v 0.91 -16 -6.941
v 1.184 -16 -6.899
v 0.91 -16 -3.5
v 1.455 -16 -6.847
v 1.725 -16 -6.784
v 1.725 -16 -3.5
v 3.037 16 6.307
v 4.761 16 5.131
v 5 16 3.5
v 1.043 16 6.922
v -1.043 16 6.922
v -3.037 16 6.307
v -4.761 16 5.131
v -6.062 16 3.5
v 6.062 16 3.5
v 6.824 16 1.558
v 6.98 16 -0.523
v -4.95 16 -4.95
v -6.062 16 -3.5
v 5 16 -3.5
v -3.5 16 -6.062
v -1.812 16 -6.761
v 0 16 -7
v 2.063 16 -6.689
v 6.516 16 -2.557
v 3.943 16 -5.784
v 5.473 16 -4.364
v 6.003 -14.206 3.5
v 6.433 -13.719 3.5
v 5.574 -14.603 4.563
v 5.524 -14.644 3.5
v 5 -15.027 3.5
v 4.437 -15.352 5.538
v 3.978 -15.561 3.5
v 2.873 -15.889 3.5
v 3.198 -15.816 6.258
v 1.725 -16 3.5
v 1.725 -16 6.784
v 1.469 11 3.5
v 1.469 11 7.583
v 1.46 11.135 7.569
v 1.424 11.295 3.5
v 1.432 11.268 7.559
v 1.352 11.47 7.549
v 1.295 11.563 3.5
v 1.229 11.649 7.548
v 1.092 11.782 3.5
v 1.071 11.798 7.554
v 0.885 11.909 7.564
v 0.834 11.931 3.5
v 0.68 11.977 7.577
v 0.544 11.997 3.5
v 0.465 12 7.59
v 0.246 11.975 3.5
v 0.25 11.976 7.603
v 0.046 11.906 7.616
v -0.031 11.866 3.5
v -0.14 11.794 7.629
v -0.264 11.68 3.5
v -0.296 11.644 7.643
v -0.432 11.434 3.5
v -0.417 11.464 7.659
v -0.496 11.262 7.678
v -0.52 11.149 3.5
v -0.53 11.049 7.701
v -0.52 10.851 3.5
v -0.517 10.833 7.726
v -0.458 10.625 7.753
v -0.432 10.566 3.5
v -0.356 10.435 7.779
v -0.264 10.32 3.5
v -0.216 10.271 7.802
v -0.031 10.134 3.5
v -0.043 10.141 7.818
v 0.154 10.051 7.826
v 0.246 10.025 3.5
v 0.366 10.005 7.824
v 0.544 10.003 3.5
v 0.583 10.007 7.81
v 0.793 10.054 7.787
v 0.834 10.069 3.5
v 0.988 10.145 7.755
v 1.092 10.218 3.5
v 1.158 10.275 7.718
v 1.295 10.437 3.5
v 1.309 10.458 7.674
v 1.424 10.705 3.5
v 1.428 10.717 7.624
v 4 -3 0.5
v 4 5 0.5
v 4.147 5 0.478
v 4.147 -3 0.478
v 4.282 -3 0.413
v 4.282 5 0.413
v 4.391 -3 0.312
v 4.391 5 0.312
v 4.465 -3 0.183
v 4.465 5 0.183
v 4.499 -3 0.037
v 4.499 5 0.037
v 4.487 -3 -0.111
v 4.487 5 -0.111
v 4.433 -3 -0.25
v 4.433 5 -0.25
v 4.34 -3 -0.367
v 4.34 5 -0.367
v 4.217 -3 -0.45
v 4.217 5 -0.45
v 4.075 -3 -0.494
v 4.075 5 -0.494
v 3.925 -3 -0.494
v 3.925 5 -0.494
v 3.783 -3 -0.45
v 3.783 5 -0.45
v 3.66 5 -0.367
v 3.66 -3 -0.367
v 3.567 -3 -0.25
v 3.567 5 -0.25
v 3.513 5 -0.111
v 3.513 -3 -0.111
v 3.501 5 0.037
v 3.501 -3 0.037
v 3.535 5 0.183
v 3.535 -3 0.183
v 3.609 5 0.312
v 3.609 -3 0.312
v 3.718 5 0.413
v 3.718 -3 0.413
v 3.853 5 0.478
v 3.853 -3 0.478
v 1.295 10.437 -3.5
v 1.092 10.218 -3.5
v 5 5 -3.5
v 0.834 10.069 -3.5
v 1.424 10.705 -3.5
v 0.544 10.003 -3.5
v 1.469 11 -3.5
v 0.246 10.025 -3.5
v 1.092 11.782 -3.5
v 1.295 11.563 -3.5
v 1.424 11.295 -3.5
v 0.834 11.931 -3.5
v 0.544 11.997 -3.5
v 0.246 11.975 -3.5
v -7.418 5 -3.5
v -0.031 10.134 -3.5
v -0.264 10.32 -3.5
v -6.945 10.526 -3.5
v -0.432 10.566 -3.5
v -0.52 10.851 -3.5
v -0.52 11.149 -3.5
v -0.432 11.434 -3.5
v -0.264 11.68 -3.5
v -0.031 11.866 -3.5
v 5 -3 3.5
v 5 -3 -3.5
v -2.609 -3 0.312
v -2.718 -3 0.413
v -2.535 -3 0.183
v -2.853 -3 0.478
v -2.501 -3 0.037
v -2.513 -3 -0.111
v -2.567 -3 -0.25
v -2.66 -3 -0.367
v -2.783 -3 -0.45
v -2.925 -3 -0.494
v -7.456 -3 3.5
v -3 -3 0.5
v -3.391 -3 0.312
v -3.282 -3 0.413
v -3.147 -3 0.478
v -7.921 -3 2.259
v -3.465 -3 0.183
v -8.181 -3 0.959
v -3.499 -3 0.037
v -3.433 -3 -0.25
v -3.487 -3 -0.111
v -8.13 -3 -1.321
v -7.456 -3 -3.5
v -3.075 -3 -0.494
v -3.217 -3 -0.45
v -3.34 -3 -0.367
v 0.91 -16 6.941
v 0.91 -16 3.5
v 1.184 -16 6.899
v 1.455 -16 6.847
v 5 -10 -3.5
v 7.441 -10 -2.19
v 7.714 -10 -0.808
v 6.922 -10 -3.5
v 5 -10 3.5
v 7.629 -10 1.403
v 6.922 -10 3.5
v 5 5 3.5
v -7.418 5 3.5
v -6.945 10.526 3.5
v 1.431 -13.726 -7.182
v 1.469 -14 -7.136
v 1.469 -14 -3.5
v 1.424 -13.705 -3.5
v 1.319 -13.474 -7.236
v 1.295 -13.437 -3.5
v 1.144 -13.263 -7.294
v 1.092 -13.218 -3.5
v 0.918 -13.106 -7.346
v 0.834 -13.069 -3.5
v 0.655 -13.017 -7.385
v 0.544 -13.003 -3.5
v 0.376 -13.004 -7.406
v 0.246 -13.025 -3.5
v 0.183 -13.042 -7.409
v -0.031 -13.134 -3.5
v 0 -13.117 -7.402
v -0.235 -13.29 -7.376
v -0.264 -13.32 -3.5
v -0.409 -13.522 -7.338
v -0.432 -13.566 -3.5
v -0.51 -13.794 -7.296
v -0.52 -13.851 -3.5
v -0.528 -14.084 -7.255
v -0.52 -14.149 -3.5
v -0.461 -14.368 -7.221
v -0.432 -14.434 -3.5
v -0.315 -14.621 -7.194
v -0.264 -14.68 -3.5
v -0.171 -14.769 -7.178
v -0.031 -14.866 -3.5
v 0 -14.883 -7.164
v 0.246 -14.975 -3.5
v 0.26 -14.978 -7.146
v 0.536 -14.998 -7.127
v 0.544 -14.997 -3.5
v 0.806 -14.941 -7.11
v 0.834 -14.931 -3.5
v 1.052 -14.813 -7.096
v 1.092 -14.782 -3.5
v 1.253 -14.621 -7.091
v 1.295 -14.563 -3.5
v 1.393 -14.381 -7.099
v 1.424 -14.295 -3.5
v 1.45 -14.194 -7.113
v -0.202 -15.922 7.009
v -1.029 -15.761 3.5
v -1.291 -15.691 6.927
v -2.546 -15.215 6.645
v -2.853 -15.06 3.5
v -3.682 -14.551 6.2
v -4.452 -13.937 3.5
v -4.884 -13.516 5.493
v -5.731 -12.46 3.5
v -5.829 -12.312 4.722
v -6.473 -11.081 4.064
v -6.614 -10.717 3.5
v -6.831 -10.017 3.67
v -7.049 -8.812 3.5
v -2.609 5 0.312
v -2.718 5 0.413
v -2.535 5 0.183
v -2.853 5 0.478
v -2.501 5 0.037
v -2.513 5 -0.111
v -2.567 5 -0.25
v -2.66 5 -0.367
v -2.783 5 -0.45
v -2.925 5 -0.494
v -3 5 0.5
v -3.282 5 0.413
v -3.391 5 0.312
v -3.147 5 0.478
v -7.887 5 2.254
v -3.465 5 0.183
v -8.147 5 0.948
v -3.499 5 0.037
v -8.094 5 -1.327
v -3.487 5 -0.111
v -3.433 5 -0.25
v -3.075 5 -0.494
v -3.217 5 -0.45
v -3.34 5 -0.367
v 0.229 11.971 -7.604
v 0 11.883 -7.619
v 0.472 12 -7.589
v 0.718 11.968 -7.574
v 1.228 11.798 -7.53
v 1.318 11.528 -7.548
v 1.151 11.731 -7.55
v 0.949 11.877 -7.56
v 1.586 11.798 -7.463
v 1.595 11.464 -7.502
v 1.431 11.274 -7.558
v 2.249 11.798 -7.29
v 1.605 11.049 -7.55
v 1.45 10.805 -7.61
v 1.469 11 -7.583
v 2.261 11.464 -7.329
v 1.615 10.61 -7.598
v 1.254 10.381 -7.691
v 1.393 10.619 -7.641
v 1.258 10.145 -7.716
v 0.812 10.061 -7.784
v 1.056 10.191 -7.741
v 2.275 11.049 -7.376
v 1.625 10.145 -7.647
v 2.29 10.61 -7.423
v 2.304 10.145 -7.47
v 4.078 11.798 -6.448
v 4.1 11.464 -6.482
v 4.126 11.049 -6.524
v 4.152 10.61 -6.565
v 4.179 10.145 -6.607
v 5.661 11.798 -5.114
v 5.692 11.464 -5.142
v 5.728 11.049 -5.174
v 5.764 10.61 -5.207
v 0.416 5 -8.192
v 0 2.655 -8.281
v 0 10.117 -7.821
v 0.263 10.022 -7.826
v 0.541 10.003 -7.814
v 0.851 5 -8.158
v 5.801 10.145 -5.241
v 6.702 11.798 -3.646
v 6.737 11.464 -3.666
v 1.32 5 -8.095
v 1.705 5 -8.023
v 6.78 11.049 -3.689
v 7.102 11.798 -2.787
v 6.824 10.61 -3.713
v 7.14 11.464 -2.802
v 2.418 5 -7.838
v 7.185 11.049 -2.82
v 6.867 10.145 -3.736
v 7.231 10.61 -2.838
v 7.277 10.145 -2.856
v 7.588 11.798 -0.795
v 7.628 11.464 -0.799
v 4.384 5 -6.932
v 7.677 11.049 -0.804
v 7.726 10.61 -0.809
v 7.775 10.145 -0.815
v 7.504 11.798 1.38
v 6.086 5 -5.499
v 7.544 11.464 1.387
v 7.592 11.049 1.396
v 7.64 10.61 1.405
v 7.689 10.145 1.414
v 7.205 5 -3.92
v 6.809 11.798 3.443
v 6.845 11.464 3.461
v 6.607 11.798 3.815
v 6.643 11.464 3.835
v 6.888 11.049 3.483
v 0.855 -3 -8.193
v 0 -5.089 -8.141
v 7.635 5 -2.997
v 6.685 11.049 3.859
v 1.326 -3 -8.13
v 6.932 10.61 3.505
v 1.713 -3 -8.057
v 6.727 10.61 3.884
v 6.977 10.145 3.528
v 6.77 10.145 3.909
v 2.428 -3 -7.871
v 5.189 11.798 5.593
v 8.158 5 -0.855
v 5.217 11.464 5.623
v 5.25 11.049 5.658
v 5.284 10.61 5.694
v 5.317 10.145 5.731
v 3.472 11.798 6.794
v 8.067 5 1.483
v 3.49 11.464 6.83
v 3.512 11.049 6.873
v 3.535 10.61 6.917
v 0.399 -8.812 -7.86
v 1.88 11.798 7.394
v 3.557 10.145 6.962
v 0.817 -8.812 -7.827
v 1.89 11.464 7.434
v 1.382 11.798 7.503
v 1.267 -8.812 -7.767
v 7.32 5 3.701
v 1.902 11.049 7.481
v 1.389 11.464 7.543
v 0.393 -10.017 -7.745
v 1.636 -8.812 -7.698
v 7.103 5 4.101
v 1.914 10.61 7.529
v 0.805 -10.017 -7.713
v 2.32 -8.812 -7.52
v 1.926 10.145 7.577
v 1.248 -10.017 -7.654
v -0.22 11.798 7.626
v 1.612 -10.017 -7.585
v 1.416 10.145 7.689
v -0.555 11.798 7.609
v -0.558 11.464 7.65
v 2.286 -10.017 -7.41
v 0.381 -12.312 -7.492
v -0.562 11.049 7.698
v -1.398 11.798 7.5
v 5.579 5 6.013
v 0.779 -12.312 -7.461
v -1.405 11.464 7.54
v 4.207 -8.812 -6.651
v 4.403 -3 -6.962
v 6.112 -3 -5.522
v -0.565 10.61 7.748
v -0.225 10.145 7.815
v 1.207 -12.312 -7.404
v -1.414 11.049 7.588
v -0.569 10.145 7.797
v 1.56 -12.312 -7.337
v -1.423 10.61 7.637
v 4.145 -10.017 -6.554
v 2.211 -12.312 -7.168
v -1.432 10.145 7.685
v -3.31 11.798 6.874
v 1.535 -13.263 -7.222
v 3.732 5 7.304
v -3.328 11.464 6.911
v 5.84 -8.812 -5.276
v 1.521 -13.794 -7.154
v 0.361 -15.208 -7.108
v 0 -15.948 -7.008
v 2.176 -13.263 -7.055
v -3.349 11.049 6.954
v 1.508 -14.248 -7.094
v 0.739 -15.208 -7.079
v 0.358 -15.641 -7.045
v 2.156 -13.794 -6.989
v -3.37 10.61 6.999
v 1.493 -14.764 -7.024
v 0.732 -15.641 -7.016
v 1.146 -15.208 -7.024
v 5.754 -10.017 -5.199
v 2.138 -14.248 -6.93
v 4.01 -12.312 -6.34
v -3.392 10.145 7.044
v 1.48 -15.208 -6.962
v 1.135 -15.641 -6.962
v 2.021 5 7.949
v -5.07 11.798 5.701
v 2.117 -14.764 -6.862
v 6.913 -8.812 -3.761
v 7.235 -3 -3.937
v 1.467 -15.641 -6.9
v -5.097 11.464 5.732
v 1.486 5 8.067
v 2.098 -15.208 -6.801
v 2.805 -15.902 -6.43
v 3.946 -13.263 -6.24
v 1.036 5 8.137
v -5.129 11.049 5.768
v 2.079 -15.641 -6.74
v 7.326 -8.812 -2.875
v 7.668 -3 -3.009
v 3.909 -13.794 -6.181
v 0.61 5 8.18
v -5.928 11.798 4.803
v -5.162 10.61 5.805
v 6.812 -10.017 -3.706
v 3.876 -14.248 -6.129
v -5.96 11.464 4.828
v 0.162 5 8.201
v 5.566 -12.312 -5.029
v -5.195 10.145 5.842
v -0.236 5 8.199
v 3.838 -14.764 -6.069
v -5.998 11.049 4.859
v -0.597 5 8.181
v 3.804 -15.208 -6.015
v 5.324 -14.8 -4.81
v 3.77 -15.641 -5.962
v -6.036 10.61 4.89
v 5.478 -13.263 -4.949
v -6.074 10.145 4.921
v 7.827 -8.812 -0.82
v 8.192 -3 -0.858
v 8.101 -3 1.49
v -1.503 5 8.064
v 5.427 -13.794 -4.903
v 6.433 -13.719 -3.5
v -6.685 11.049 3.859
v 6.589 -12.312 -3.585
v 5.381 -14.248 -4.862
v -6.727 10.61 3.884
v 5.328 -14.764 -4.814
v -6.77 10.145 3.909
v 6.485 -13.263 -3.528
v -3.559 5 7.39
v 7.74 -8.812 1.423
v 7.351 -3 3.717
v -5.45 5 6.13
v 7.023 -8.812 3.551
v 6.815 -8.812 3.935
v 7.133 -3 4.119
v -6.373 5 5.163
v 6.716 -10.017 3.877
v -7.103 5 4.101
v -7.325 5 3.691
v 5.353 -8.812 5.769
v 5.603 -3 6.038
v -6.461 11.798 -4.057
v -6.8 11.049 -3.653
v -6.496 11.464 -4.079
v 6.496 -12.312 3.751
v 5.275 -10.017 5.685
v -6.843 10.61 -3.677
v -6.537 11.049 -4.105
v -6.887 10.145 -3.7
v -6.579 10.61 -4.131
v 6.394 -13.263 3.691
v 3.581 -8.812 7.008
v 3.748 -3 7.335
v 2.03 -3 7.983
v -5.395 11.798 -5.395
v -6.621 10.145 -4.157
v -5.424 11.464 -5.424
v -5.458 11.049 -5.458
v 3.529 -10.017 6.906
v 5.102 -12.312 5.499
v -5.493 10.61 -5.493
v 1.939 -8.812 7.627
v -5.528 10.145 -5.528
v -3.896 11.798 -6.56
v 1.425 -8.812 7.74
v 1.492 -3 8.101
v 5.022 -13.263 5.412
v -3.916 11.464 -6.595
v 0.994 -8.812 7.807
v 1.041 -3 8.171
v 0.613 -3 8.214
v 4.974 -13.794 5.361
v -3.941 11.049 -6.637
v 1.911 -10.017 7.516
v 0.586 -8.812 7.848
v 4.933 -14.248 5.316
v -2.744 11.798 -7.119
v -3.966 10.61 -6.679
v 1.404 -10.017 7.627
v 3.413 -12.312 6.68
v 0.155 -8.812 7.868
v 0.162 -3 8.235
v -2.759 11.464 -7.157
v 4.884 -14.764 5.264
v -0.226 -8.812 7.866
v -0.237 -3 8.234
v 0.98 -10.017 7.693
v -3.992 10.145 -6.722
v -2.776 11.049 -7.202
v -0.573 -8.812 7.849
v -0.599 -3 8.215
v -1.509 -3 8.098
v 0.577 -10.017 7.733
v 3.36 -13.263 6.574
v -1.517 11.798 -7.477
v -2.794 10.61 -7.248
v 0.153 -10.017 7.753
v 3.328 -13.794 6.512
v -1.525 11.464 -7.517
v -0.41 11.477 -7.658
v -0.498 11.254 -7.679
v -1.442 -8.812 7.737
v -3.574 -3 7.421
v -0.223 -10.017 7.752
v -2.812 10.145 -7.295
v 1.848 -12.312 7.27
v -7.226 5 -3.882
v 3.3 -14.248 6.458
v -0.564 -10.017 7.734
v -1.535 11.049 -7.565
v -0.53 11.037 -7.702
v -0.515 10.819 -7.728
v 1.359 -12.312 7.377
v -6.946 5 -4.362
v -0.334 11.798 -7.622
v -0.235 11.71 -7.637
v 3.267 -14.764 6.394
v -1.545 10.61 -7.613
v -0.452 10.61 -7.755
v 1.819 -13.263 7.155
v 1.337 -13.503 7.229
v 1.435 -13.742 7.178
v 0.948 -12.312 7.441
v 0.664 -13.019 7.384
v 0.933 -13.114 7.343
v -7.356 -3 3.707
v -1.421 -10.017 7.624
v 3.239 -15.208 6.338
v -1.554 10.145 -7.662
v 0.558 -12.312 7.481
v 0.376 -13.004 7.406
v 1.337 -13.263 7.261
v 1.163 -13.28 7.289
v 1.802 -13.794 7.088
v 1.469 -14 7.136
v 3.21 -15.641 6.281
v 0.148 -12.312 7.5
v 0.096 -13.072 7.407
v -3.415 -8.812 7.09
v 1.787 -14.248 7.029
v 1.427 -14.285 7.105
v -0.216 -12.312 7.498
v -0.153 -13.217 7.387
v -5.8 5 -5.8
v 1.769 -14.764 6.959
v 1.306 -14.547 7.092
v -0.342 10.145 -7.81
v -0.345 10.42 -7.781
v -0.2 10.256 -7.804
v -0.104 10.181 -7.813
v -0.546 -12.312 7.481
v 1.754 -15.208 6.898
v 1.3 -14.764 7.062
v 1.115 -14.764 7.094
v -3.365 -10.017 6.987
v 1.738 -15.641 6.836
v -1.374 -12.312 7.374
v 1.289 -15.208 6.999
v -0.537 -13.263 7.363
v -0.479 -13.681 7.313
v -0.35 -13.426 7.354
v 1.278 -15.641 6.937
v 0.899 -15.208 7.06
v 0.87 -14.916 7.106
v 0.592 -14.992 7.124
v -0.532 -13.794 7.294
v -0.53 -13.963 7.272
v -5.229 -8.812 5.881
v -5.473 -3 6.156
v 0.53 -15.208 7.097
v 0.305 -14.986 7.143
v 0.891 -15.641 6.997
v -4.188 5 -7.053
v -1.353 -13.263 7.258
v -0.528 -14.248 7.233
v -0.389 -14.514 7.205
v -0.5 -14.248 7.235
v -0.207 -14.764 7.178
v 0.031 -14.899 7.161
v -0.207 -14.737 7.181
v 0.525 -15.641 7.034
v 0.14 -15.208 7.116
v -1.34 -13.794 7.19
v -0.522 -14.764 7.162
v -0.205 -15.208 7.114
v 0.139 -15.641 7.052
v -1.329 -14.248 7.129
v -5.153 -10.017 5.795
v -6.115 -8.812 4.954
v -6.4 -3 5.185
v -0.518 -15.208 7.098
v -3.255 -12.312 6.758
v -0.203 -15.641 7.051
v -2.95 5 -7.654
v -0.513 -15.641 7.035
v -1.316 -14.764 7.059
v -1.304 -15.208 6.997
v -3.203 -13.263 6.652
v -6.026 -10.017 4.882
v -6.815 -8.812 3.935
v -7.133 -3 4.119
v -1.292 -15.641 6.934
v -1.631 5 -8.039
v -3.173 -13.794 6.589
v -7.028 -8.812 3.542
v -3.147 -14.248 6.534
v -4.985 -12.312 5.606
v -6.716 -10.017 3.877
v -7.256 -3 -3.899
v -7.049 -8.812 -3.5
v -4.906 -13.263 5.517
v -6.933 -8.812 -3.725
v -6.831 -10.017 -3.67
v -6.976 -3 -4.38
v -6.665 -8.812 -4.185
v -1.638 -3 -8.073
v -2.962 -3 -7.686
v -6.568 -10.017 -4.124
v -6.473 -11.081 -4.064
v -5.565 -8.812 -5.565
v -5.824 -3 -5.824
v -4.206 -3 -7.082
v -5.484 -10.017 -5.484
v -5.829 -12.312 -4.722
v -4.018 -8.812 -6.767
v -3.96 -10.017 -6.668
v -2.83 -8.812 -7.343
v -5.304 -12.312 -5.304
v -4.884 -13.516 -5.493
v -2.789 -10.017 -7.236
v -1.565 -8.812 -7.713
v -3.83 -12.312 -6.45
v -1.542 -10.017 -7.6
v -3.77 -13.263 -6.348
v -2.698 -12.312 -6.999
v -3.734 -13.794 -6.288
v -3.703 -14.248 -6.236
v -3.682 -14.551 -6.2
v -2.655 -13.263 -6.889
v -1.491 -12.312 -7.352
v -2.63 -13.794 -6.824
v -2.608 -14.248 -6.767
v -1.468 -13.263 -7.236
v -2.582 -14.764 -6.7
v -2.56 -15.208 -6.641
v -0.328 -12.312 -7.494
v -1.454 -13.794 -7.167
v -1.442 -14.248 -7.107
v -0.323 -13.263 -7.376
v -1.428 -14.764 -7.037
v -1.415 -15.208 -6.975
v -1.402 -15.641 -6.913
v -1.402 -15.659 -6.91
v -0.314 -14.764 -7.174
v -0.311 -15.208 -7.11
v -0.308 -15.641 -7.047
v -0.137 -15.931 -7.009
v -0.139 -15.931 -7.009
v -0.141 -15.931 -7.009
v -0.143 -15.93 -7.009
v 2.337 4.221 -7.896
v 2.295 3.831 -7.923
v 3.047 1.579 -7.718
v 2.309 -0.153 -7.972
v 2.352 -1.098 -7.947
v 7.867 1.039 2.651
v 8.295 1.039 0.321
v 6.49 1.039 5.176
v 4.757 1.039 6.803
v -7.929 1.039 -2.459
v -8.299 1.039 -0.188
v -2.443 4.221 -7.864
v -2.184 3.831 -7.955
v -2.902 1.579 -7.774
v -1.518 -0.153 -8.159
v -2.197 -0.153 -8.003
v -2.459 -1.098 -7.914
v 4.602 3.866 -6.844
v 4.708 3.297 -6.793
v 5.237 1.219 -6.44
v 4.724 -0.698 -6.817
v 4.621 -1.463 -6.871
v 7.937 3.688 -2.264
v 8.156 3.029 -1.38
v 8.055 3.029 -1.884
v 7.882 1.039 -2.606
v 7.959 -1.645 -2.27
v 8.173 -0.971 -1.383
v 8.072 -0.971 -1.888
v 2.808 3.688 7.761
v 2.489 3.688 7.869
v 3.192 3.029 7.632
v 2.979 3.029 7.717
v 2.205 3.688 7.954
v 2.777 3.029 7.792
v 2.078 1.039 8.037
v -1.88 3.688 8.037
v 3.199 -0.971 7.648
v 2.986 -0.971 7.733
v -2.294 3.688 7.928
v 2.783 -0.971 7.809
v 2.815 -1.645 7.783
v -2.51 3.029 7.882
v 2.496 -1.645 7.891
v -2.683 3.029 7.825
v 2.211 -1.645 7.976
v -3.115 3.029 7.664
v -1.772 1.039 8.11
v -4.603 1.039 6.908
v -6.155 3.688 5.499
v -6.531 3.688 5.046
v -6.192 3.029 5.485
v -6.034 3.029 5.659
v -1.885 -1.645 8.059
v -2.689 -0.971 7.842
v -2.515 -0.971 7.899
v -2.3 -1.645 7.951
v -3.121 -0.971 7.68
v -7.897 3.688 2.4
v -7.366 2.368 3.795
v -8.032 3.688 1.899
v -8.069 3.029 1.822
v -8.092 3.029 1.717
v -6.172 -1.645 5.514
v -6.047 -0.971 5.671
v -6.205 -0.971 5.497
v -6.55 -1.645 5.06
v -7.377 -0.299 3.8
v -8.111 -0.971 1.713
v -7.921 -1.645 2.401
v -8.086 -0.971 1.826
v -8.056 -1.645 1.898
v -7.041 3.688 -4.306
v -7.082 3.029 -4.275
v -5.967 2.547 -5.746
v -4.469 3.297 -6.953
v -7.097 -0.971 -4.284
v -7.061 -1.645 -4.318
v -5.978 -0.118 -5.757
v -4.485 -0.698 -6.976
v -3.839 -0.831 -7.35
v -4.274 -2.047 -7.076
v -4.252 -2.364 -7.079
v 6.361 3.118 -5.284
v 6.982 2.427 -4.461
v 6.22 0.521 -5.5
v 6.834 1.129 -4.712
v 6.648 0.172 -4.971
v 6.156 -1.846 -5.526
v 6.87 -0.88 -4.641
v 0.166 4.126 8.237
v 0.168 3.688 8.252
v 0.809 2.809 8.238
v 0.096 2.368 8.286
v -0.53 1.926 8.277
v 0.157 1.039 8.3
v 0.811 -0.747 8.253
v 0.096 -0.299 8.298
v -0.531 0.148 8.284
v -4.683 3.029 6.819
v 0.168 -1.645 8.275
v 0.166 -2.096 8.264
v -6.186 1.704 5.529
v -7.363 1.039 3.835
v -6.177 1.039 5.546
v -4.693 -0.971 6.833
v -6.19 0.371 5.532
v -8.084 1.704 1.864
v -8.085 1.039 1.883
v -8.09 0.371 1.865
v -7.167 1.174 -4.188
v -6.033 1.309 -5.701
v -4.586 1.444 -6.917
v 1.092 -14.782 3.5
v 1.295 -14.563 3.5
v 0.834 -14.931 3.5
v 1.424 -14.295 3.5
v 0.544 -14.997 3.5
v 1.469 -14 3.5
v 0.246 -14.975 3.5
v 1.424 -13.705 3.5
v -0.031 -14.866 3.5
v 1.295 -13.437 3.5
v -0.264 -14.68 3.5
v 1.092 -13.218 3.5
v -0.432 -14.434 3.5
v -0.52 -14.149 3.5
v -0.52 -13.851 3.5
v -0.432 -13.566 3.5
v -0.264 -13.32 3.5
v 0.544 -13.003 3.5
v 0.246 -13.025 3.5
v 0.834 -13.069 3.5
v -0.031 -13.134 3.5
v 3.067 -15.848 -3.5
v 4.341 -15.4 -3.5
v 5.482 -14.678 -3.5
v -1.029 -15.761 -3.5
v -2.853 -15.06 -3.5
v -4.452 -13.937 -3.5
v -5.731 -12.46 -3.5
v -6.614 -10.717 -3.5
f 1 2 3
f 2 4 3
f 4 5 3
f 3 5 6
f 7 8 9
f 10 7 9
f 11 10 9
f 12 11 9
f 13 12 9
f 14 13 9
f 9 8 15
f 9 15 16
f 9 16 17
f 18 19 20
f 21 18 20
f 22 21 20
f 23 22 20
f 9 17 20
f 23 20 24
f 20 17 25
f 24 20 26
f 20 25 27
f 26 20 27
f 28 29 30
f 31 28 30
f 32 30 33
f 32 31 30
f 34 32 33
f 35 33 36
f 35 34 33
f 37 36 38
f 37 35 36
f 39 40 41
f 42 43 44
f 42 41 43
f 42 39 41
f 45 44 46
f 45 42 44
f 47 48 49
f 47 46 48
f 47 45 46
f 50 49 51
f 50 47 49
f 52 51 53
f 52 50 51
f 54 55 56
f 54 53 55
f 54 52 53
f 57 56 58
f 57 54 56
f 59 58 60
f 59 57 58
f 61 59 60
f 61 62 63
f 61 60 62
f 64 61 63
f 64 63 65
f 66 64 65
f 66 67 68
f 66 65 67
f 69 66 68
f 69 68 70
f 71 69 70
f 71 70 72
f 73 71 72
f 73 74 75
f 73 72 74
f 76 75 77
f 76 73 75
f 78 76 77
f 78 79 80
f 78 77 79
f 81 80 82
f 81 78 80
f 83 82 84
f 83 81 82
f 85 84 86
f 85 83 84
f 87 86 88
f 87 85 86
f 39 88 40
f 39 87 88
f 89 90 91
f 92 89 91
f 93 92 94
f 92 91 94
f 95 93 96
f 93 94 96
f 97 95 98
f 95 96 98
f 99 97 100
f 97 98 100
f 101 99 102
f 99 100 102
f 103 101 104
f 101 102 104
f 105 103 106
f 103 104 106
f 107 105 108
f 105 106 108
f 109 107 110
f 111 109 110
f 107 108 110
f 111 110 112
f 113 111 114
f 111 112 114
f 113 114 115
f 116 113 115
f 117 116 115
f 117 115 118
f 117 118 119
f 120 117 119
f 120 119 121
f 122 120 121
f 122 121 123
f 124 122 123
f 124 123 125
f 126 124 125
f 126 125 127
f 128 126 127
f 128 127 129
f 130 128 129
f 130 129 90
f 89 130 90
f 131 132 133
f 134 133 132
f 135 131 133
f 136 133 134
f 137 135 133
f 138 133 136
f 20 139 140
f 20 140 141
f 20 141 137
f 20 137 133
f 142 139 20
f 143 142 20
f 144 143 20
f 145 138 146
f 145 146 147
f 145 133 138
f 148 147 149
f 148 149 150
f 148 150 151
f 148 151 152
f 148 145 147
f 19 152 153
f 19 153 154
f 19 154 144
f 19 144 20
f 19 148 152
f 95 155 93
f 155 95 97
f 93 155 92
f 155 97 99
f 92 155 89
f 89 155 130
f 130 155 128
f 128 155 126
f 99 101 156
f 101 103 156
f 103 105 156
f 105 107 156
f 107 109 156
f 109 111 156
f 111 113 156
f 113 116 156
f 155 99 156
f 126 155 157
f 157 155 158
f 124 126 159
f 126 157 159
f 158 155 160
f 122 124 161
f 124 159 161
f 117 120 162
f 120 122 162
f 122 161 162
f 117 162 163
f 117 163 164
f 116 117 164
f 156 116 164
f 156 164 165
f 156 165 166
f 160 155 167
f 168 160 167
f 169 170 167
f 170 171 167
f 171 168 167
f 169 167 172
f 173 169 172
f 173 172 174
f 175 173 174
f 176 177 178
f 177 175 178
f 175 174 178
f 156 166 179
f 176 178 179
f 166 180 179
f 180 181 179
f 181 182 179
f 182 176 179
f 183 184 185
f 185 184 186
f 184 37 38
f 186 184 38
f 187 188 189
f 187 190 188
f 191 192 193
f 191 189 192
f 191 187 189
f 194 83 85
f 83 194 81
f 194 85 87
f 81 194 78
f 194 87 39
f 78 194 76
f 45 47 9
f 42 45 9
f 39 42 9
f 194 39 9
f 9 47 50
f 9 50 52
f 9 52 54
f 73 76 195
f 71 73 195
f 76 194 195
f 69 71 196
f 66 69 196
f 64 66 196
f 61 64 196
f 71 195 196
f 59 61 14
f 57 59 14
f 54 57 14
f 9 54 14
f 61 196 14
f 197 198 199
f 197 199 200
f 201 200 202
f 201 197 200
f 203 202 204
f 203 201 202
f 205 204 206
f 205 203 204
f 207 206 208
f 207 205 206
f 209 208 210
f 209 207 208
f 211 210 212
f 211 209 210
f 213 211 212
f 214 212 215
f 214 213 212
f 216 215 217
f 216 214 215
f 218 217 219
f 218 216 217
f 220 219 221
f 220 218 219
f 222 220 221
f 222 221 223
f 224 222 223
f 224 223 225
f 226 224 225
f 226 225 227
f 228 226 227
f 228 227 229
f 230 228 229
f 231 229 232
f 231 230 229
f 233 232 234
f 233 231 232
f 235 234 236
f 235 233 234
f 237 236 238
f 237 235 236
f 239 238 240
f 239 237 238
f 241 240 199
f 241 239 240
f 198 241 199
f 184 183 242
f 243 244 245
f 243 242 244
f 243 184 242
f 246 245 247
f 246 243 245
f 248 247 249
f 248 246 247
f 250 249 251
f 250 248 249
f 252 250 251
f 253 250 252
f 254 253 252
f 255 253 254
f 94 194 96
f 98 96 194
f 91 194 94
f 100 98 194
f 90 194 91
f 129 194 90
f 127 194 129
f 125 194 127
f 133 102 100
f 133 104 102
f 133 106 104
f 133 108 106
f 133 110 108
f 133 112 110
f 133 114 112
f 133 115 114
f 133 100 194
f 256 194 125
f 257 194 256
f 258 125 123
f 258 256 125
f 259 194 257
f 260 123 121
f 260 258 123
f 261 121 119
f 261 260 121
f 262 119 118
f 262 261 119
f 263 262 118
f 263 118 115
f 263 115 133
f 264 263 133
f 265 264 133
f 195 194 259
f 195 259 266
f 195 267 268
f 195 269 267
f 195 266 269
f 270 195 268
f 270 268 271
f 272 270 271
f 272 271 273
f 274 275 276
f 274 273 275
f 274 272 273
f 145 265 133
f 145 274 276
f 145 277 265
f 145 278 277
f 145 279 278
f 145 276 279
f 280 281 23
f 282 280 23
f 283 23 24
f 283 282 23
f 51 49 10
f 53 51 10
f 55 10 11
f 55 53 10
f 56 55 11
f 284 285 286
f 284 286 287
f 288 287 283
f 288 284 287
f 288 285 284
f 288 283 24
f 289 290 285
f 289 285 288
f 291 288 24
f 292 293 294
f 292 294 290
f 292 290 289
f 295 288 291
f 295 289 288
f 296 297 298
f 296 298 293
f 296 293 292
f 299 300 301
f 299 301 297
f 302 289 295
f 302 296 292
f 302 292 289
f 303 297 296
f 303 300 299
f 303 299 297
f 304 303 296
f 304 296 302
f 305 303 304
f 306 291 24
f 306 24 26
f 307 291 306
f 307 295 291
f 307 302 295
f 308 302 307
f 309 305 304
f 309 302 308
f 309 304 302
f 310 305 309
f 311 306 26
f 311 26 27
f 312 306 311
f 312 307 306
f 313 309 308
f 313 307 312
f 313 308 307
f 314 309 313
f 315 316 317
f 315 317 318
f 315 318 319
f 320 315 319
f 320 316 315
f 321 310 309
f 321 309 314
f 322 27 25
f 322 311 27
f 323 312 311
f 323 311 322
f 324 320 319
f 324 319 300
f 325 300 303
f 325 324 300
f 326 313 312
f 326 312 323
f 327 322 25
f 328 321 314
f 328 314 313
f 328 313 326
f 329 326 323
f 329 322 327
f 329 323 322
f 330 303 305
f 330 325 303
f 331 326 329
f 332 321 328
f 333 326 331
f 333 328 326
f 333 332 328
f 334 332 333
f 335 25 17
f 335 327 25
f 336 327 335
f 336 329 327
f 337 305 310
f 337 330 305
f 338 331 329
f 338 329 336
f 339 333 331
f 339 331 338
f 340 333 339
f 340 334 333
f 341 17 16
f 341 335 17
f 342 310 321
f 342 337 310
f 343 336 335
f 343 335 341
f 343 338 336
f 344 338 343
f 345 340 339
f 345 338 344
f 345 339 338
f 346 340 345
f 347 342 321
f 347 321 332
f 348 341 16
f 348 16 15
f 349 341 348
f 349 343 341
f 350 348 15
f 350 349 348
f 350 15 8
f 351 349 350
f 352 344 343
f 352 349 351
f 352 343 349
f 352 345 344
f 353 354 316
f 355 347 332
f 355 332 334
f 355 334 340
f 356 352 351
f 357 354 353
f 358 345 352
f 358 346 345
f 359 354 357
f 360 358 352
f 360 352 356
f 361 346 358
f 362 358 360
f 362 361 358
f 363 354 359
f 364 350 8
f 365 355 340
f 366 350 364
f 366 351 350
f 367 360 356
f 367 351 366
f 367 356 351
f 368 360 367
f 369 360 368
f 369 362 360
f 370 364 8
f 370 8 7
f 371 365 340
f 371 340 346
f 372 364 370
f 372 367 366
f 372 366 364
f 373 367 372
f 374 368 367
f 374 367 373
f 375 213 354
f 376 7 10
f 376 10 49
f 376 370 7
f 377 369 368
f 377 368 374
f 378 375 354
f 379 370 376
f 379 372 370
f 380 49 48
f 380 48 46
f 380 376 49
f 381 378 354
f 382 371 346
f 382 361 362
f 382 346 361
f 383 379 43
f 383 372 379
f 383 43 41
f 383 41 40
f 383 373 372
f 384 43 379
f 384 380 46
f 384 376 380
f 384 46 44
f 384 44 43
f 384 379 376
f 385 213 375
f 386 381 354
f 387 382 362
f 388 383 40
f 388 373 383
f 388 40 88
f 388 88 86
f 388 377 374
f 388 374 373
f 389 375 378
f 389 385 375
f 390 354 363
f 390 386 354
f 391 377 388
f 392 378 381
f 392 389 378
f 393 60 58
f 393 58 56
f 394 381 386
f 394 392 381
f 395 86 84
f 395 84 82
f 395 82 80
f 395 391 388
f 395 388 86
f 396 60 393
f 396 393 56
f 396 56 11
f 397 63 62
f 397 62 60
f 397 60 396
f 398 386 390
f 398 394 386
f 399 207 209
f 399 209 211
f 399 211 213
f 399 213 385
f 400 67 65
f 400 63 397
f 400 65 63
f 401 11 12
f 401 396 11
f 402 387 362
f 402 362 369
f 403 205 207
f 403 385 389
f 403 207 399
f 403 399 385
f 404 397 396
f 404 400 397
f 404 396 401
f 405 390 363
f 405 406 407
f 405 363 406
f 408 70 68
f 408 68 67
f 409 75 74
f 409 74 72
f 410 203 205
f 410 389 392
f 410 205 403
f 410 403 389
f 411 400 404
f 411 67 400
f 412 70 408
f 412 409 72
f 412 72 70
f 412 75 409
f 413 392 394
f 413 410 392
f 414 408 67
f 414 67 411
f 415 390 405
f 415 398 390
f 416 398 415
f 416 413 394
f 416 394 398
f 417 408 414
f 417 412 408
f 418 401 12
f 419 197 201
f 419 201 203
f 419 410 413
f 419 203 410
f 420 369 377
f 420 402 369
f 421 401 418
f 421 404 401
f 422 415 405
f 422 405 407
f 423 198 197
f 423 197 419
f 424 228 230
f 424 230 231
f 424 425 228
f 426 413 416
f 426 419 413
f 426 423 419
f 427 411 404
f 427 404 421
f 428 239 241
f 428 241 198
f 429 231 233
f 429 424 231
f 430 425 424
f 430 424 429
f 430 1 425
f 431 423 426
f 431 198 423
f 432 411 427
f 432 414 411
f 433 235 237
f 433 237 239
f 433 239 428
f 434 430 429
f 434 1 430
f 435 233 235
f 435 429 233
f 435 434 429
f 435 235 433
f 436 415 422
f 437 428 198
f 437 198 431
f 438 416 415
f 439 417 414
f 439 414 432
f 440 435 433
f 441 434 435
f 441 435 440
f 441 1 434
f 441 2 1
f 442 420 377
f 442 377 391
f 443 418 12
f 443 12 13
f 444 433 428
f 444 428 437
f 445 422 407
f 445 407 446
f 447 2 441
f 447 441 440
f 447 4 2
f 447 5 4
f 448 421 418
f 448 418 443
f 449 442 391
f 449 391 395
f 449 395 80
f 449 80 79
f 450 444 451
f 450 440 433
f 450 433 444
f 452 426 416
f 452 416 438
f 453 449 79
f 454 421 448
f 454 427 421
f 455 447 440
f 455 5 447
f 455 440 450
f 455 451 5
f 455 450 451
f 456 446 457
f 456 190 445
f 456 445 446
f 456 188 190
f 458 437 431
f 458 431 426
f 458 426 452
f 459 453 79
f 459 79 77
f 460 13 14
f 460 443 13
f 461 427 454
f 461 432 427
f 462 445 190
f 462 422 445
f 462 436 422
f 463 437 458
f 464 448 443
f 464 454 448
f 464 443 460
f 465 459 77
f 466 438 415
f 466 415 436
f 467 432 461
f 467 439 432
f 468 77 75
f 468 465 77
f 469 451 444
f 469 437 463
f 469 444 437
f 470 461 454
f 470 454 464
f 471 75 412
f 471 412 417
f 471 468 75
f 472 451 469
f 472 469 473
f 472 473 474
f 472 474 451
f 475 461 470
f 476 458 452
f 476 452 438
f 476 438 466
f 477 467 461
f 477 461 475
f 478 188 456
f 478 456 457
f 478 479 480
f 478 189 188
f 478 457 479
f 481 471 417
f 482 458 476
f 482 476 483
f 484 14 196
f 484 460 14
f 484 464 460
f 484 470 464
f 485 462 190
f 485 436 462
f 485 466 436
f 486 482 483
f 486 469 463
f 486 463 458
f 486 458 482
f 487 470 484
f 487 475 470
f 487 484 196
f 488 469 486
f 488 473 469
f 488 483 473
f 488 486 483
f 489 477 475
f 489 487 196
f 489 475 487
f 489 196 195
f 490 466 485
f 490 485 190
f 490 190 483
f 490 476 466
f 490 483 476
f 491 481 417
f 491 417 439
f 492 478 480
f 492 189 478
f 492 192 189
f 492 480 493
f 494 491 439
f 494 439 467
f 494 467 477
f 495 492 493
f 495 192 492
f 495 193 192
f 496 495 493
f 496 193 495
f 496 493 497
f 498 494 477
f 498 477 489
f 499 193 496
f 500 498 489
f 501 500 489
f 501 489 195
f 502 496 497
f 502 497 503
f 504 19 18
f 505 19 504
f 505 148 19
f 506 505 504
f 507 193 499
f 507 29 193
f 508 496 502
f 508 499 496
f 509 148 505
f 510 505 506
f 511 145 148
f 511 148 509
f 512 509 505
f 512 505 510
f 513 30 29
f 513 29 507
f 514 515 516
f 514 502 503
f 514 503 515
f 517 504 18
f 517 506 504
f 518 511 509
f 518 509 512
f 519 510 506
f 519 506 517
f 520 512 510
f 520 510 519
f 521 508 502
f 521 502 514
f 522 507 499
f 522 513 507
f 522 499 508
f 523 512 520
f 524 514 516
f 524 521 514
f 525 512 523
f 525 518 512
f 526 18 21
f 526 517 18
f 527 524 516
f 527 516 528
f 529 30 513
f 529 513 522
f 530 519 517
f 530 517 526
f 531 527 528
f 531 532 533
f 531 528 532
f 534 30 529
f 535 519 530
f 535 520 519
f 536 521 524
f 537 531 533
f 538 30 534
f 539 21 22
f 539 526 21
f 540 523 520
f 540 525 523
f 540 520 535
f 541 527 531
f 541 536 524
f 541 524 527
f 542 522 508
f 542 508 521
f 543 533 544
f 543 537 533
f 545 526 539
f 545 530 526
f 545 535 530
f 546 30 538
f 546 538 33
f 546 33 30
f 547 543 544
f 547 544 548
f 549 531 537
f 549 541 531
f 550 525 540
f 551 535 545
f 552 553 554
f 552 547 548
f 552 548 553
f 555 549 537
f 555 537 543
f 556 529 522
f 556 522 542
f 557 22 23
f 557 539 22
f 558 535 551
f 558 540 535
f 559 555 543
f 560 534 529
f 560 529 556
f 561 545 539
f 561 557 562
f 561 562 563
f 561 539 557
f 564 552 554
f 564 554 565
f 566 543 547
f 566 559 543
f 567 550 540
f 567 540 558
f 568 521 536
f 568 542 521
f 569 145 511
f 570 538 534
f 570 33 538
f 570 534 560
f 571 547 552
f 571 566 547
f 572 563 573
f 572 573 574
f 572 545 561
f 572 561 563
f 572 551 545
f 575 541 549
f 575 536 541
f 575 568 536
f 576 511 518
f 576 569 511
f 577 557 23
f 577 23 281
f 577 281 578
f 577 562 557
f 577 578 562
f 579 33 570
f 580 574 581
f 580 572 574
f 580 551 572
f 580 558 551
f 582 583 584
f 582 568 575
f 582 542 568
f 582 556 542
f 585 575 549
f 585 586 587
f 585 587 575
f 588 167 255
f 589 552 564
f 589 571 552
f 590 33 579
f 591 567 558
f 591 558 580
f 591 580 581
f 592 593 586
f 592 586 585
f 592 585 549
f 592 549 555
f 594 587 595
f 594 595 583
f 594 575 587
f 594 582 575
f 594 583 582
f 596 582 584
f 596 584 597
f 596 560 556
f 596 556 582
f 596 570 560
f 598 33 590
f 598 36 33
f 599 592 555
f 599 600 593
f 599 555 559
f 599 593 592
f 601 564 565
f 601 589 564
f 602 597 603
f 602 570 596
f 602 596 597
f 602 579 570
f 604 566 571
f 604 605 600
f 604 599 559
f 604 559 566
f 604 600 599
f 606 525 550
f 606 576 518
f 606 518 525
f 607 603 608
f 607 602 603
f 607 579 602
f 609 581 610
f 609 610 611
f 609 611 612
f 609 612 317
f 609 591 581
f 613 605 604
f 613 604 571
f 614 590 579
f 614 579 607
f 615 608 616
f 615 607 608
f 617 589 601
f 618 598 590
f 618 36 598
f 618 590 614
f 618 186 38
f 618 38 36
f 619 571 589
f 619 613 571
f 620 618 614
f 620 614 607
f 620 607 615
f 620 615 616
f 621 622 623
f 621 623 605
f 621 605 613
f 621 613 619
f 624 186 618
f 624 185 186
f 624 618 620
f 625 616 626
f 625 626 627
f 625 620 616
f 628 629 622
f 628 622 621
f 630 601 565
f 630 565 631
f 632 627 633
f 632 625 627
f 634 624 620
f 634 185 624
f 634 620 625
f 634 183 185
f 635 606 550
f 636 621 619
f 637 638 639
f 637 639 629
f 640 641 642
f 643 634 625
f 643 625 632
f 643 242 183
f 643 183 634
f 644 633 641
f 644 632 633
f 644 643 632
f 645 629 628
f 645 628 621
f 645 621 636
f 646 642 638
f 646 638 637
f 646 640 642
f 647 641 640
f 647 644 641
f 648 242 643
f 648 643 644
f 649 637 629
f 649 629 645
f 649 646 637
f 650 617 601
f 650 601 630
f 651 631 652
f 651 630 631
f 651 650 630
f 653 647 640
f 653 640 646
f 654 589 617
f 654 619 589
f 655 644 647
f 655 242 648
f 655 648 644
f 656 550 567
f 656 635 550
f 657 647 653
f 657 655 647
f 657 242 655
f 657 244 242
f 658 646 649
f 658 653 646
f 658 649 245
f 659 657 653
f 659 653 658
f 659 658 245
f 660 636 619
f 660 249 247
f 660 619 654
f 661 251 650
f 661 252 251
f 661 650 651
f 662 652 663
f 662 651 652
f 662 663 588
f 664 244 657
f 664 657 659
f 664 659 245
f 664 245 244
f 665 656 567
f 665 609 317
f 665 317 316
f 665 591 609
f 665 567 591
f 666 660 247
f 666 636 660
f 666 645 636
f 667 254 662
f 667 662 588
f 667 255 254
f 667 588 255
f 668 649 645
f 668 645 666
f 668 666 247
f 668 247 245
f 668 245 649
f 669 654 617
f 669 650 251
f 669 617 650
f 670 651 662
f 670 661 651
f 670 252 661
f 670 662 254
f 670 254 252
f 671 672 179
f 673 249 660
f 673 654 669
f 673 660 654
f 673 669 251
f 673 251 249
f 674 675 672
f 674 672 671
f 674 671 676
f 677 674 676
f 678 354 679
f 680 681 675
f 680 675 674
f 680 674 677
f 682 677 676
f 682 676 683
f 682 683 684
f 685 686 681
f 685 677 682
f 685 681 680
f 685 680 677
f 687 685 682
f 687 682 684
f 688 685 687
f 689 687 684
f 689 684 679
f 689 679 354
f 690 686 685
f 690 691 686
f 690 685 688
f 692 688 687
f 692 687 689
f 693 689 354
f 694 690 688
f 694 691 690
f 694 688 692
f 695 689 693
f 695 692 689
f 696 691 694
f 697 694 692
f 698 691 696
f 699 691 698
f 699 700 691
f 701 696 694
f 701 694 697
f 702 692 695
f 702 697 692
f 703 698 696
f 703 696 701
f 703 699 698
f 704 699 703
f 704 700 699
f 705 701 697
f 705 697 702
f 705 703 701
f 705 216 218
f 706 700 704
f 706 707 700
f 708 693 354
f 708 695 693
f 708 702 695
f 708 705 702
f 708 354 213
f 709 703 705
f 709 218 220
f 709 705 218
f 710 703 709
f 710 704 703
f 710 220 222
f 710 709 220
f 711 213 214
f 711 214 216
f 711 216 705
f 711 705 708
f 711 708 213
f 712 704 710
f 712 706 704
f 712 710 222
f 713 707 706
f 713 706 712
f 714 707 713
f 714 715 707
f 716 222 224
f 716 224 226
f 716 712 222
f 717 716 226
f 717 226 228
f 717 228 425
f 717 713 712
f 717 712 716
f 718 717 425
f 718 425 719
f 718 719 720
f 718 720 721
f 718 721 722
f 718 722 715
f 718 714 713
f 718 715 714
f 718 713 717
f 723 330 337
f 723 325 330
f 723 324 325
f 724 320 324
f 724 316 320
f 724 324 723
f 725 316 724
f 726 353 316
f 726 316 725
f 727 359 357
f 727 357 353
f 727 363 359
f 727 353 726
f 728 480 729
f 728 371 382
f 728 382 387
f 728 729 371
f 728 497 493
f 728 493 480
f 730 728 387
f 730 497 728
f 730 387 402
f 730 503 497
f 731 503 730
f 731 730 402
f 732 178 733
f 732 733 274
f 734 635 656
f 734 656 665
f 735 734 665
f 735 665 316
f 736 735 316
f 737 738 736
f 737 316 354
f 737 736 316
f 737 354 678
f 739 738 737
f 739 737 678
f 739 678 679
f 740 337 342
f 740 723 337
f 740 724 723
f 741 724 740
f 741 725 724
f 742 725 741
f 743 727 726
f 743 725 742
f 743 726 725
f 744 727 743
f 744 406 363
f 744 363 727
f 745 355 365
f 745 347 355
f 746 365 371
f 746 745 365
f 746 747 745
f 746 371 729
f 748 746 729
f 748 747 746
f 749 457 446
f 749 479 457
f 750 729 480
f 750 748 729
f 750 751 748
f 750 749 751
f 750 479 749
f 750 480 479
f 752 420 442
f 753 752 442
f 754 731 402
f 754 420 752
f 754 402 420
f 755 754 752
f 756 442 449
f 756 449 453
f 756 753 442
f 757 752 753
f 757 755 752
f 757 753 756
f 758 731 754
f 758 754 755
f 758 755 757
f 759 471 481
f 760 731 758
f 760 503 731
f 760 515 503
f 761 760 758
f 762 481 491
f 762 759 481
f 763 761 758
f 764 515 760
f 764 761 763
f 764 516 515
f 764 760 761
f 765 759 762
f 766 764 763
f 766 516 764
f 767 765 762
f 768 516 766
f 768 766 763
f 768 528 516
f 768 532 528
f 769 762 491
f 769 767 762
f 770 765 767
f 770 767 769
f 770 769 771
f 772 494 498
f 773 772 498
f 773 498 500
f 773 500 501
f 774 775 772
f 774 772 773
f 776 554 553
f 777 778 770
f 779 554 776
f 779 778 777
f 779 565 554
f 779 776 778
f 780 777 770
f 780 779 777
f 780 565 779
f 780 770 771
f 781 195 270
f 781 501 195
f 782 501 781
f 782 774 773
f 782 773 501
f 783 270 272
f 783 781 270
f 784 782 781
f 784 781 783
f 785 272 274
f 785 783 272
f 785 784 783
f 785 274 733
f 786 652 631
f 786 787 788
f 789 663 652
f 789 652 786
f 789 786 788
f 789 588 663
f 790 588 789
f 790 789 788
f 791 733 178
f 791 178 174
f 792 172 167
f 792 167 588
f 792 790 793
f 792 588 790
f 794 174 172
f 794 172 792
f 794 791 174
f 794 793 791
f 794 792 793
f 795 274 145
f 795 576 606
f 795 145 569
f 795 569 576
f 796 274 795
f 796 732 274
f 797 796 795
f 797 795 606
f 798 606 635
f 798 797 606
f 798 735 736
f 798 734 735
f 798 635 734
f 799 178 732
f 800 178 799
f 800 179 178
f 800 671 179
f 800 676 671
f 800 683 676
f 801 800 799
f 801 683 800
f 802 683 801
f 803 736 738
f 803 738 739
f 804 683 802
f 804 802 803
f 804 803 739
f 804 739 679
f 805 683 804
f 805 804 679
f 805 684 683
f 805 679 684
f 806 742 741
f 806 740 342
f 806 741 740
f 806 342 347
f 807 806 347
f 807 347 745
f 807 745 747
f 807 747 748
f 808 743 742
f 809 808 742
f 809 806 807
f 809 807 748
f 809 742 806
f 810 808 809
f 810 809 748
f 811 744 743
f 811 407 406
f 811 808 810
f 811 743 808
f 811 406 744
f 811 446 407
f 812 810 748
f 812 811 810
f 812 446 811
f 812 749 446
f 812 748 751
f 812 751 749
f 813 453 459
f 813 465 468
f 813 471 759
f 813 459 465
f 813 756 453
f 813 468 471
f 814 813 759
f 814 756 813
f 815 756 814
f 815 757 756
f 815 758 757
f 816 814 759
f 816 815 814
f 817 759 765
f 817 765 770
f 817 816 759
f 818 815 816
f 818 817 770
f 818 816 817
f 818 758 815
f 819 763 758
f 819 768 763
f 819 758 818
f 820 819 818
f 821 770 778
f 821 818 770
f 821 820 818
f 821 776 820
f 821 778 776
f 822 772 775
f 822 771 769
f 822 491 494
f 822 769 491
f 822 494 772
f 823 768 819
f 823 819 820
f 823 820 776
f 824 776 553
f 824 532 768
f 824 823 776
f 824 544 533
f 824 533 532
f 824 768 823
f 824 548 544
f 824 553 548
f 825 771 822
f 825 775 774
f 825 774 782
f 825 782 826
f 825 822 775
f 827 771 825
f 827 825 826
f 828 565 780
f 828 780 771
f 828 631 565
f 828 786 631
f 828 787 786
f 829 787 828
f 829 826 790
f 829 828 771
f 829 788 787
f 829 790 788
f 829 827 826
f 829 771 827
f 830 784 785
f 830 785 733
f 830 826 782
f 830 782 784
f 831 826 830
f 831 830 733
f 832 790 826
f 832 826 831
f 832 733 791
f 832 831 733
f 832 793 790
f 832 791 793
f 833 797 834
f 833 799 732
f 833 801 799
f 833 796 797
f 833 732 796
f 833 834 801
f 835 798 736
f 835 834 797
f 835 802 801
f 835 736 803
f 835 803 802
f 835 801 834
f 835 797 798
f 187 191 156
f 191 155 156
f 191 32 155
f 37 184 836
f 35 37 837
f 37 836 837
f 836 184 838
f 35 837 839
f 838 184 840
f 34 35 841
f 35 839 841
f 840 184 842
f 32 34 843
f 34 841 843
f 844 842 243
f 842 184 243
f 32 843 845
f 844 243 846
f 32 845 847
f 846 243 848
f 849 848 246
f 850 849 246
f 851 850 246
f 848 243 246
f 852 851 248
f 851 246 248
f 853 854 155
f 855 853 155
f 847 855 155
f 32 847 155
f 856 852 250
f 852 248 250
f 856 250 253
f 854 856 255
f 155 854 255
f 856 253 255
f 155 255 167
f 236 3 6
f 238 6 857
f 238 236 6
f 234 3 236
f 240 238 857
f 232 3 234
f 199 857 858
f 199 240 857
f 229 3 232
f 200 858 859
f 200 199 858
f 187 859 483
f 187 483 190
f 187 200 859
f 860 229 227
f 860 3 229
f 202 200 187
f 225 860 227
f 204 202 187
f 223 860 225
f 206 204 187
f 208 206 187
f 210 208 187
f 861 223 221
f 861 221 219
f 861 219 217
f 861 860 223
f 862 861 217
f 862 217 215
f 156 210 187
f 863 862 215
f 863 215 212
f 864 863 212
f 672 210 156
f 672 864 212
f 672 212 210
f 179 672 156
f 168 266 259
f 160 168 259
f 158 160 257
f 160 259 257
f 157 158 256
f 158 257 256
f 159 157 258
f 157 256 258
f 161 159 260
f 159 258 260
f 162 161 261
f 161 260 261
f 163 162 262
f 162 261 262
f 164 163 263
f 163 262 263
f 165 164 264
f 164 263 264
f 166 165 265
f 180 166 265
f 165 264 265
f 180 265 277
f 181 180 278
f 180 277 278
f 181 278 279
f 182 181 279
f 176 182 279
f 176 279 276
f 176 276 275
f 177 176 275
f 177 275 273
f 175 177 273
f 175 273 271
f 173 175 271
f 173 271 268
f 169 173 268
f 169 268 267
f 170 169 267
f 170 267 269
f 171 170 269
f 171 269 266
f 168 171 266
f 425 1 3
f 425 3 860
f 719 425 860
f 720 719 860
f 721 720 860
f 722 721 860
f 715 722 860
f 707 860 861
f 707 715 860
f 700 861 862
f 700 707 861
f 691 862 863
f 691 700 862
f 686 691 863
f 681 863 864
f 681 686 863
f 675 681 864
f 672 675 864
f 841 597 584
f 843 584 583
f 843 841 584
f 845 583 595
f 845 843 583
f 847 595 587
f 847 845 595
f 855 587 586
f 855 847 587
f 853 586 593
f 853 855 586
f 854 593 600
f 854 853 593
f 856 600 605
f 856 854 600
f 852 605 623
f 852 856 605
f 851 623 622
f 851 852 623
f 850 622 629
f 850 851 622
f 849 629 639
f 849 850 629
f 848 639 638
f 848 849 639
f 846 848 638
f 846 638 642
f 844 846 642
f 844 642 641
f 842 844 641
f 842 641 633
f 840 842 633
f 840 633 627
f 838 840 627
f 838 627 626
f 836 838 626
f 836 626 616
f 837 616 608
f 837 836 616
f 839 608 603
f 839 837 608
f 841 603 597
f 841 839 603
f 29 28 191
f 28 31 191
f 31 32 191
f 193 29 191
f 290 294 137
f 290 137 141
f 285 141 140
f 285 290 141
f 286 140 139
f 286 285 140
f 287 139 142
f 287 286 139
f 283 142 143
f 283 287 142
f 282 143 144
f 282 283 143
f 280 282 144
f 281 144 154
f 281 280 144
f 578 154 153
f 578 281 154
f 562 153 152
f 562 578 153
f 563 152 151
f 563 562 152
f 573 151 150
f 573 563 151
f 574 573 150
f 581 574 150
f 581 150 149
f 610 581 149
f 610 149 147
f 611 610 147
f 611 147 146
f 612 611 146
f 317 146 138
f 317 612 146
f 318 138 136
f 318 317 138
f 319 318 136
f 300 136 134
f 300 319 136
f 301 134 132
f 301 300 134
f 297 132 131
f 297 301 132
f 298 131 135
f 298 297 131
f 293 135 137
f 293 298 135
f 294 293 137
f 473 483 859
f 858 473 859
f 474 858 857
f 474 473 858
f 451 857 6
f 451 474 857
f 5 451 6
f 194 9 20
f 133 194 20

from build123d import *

# Parameters (mm, degrees)
CUT_EXTRUDE1_DEPTH      = 5
CUT_EXTRUDE1_DEPTH_BACK = 20.845866419
SKETCH2_W               = 7
SKETCH2_H               = 11
SKETCH2_H_2             = 13
CUT_EXTRUDE2_DEPTH      = 20.845866419
CUT_EXTRUDE2_DEPTH_BACK = 20.845866419
SKETCH3_R               = 1
CUT_EXTRUDE4_START      = 10
CUT_EXTRUDE4_DEPTH      = 20
SKETCH6_R               = 0.5
CUT_EXTRUDE5_DEPTH      = 25.059476613
SKETCH7_W               = 6.999992022
SKETCH7_H               = 6
CUT_EXTRUDE6_DEPTH      = 23.402723679


with BuildPart() as part:
    # Sketch1 → Revolve1 (revolve)
    with BuildSketch(Plane(origin=(0, 0, 0), x_dir=(0, 0, -1), z_dir=(1, 0, 0))):
        with BuildLine():
            Line((0, 16), (0, -16))
            Line((0, -16), (7, -16))
            add(Edge.make_bspline(
                [(7, 16), (9.604722665, 1.227883705), (7, -16)],
                knots=[0, 0, 0, 1, 1, 1], degree=2))
            Line((7, 16), (0, 16))
        make_face()
    revolve(axis=Axis((0, 16, 0), (0, -1, 0)))

    # Sketch2 → Cut-Extrude1 (cut, two sides: drawn at the far end of the back side and taken through both)
    with BuildSketch(Plane(origin=(0, 0, 0), x_dir=(0, 0, -1), z_dir=(1, 0, 0)).offset(-CUT_EXTRUDE1_DEPTH_BACK)):
        with Locations((0, 10.5)):
            Rectangle(SKETCH2_W, SKETCH2_H)
        with Locations((0, -9.5)):
            Rectangle(SKETCH2_W, SKETCH2_H_2)
    extrude(amount=CUT_EXTRUDE1_DEPTH + CUT_EXTRUDE1_DEPTH_BACK, mode=Mode.SUBTRACT)

    # Sketch3 → Cut-Extrude2 (cut, two sides: drawn at the far end of the back side and taken through both)
    with BuildSketch(Plane.XY.offset(-CUT_EXTRUDE2_DEPTH_BACK)):
        with Locations((0.468911087, 11)):
            Circle(SKETCH3_R)
        with Locations((0.468911087, -14)):
            Circle(SKETCH3_R)
    extrude(amount=CUT_EXTRUDE2_DEPTH + CUT_EXTRUDE2_DEPTH_BACK, mode=Mode.SUBTRACT)

    # Sketch5 → Cut-Extrude4 (cut)
    with BuildSketch(Plane.XY.offset(CUT_EXTRUDE4_START)):
        with BuildLine():
            Line((-6.062177826, -16), (0.910117982, -16))
            ThreePointArc((0.910117982, -16), (-4.45732236, -13.932165218), (-7.050017744, -8.797646043))
            add(Edge.make_bspline(
                [(-6.062177826, -16), (-6.437757064, -13.848691714), (-6.741485315, -11.68967719), (-7.000647249, -9.281372163), (-7.025777059, -9.039556784), (-7.050017744, -8.797646043)],
                knots=[0, 0, 0, 0, 0.5, 0.5, 0.555783836, 0.555783836, 0.555783836, 0.555783836], degree=3))
        make_face()
        with BuildLine():
            add(Edge.make_bspline(
                [(7, -16), (7.013595799, -15.909695487), (7.040767758, -15.729216903), (7.080753669, -15.458583276), (7.146297525, -15.008691454), (7.29056419, -13.986943062), (7.487309278, -12.468895785), (7.629352159, -11.218602021), (7.691486496, -10.632009884)],
                knots=[0, 0, 0, 0, 0.008523827, 0.017035341, 0.025534583, 0.05095908, 0.113348633, 0.168406234, 0.168406234, 0.168406234, 0.168406234], degree=3))
            ThreePointArc((7.691486496, -10.632009884), (5.737840967, -14.46049657), (1.724865718, -16))
            Line((1.724865718, -16), (7, -16))
        make_face()
    extrude(amount=-CUT_EXTRUDE4_DEPTH, mode=Mode.SUBTRACT)


with BuildPart() as cut_extrude4_kept_piece:
    # of the separate pieces the step leaves, the one the design keeps (cut_extrude4_pieces_kept)
    add(part.part.solids().sort_by_distance((0.910117982, -16, -6.940582487))[0])

    # Sketch6 → Cut-Extrude5 (cut, through all)
    with BuildSketch(Plane(origin=(0, 5, 0), x_dir=(1, 0, 0), z_dir=(0, 1, 0))):
        with Locations((4, 0)):
            Circle(SKETCH6_R)
        with Locations((-3, 0)):
            Circle(SKETCH6_R)
    extrude(amount=-CUT_EXTRUDE5_DEPTH, mode=Mode.SUBTRACT)

    # Sketch7 → Cut-Extrude6 (cut, through all)
    with BuildSketch(Plane.ZY.offset(-5)):
        with Locations((-3.989e-06, -13)):
            Rectangle(SKETCH7_W, SKETCH7_H)
    extrude(amount=-CUT_EXTRUDE6_DEPTH, mode=Mode.SUBTRACT)


solid = cut_extrude4_kept_piece.part
